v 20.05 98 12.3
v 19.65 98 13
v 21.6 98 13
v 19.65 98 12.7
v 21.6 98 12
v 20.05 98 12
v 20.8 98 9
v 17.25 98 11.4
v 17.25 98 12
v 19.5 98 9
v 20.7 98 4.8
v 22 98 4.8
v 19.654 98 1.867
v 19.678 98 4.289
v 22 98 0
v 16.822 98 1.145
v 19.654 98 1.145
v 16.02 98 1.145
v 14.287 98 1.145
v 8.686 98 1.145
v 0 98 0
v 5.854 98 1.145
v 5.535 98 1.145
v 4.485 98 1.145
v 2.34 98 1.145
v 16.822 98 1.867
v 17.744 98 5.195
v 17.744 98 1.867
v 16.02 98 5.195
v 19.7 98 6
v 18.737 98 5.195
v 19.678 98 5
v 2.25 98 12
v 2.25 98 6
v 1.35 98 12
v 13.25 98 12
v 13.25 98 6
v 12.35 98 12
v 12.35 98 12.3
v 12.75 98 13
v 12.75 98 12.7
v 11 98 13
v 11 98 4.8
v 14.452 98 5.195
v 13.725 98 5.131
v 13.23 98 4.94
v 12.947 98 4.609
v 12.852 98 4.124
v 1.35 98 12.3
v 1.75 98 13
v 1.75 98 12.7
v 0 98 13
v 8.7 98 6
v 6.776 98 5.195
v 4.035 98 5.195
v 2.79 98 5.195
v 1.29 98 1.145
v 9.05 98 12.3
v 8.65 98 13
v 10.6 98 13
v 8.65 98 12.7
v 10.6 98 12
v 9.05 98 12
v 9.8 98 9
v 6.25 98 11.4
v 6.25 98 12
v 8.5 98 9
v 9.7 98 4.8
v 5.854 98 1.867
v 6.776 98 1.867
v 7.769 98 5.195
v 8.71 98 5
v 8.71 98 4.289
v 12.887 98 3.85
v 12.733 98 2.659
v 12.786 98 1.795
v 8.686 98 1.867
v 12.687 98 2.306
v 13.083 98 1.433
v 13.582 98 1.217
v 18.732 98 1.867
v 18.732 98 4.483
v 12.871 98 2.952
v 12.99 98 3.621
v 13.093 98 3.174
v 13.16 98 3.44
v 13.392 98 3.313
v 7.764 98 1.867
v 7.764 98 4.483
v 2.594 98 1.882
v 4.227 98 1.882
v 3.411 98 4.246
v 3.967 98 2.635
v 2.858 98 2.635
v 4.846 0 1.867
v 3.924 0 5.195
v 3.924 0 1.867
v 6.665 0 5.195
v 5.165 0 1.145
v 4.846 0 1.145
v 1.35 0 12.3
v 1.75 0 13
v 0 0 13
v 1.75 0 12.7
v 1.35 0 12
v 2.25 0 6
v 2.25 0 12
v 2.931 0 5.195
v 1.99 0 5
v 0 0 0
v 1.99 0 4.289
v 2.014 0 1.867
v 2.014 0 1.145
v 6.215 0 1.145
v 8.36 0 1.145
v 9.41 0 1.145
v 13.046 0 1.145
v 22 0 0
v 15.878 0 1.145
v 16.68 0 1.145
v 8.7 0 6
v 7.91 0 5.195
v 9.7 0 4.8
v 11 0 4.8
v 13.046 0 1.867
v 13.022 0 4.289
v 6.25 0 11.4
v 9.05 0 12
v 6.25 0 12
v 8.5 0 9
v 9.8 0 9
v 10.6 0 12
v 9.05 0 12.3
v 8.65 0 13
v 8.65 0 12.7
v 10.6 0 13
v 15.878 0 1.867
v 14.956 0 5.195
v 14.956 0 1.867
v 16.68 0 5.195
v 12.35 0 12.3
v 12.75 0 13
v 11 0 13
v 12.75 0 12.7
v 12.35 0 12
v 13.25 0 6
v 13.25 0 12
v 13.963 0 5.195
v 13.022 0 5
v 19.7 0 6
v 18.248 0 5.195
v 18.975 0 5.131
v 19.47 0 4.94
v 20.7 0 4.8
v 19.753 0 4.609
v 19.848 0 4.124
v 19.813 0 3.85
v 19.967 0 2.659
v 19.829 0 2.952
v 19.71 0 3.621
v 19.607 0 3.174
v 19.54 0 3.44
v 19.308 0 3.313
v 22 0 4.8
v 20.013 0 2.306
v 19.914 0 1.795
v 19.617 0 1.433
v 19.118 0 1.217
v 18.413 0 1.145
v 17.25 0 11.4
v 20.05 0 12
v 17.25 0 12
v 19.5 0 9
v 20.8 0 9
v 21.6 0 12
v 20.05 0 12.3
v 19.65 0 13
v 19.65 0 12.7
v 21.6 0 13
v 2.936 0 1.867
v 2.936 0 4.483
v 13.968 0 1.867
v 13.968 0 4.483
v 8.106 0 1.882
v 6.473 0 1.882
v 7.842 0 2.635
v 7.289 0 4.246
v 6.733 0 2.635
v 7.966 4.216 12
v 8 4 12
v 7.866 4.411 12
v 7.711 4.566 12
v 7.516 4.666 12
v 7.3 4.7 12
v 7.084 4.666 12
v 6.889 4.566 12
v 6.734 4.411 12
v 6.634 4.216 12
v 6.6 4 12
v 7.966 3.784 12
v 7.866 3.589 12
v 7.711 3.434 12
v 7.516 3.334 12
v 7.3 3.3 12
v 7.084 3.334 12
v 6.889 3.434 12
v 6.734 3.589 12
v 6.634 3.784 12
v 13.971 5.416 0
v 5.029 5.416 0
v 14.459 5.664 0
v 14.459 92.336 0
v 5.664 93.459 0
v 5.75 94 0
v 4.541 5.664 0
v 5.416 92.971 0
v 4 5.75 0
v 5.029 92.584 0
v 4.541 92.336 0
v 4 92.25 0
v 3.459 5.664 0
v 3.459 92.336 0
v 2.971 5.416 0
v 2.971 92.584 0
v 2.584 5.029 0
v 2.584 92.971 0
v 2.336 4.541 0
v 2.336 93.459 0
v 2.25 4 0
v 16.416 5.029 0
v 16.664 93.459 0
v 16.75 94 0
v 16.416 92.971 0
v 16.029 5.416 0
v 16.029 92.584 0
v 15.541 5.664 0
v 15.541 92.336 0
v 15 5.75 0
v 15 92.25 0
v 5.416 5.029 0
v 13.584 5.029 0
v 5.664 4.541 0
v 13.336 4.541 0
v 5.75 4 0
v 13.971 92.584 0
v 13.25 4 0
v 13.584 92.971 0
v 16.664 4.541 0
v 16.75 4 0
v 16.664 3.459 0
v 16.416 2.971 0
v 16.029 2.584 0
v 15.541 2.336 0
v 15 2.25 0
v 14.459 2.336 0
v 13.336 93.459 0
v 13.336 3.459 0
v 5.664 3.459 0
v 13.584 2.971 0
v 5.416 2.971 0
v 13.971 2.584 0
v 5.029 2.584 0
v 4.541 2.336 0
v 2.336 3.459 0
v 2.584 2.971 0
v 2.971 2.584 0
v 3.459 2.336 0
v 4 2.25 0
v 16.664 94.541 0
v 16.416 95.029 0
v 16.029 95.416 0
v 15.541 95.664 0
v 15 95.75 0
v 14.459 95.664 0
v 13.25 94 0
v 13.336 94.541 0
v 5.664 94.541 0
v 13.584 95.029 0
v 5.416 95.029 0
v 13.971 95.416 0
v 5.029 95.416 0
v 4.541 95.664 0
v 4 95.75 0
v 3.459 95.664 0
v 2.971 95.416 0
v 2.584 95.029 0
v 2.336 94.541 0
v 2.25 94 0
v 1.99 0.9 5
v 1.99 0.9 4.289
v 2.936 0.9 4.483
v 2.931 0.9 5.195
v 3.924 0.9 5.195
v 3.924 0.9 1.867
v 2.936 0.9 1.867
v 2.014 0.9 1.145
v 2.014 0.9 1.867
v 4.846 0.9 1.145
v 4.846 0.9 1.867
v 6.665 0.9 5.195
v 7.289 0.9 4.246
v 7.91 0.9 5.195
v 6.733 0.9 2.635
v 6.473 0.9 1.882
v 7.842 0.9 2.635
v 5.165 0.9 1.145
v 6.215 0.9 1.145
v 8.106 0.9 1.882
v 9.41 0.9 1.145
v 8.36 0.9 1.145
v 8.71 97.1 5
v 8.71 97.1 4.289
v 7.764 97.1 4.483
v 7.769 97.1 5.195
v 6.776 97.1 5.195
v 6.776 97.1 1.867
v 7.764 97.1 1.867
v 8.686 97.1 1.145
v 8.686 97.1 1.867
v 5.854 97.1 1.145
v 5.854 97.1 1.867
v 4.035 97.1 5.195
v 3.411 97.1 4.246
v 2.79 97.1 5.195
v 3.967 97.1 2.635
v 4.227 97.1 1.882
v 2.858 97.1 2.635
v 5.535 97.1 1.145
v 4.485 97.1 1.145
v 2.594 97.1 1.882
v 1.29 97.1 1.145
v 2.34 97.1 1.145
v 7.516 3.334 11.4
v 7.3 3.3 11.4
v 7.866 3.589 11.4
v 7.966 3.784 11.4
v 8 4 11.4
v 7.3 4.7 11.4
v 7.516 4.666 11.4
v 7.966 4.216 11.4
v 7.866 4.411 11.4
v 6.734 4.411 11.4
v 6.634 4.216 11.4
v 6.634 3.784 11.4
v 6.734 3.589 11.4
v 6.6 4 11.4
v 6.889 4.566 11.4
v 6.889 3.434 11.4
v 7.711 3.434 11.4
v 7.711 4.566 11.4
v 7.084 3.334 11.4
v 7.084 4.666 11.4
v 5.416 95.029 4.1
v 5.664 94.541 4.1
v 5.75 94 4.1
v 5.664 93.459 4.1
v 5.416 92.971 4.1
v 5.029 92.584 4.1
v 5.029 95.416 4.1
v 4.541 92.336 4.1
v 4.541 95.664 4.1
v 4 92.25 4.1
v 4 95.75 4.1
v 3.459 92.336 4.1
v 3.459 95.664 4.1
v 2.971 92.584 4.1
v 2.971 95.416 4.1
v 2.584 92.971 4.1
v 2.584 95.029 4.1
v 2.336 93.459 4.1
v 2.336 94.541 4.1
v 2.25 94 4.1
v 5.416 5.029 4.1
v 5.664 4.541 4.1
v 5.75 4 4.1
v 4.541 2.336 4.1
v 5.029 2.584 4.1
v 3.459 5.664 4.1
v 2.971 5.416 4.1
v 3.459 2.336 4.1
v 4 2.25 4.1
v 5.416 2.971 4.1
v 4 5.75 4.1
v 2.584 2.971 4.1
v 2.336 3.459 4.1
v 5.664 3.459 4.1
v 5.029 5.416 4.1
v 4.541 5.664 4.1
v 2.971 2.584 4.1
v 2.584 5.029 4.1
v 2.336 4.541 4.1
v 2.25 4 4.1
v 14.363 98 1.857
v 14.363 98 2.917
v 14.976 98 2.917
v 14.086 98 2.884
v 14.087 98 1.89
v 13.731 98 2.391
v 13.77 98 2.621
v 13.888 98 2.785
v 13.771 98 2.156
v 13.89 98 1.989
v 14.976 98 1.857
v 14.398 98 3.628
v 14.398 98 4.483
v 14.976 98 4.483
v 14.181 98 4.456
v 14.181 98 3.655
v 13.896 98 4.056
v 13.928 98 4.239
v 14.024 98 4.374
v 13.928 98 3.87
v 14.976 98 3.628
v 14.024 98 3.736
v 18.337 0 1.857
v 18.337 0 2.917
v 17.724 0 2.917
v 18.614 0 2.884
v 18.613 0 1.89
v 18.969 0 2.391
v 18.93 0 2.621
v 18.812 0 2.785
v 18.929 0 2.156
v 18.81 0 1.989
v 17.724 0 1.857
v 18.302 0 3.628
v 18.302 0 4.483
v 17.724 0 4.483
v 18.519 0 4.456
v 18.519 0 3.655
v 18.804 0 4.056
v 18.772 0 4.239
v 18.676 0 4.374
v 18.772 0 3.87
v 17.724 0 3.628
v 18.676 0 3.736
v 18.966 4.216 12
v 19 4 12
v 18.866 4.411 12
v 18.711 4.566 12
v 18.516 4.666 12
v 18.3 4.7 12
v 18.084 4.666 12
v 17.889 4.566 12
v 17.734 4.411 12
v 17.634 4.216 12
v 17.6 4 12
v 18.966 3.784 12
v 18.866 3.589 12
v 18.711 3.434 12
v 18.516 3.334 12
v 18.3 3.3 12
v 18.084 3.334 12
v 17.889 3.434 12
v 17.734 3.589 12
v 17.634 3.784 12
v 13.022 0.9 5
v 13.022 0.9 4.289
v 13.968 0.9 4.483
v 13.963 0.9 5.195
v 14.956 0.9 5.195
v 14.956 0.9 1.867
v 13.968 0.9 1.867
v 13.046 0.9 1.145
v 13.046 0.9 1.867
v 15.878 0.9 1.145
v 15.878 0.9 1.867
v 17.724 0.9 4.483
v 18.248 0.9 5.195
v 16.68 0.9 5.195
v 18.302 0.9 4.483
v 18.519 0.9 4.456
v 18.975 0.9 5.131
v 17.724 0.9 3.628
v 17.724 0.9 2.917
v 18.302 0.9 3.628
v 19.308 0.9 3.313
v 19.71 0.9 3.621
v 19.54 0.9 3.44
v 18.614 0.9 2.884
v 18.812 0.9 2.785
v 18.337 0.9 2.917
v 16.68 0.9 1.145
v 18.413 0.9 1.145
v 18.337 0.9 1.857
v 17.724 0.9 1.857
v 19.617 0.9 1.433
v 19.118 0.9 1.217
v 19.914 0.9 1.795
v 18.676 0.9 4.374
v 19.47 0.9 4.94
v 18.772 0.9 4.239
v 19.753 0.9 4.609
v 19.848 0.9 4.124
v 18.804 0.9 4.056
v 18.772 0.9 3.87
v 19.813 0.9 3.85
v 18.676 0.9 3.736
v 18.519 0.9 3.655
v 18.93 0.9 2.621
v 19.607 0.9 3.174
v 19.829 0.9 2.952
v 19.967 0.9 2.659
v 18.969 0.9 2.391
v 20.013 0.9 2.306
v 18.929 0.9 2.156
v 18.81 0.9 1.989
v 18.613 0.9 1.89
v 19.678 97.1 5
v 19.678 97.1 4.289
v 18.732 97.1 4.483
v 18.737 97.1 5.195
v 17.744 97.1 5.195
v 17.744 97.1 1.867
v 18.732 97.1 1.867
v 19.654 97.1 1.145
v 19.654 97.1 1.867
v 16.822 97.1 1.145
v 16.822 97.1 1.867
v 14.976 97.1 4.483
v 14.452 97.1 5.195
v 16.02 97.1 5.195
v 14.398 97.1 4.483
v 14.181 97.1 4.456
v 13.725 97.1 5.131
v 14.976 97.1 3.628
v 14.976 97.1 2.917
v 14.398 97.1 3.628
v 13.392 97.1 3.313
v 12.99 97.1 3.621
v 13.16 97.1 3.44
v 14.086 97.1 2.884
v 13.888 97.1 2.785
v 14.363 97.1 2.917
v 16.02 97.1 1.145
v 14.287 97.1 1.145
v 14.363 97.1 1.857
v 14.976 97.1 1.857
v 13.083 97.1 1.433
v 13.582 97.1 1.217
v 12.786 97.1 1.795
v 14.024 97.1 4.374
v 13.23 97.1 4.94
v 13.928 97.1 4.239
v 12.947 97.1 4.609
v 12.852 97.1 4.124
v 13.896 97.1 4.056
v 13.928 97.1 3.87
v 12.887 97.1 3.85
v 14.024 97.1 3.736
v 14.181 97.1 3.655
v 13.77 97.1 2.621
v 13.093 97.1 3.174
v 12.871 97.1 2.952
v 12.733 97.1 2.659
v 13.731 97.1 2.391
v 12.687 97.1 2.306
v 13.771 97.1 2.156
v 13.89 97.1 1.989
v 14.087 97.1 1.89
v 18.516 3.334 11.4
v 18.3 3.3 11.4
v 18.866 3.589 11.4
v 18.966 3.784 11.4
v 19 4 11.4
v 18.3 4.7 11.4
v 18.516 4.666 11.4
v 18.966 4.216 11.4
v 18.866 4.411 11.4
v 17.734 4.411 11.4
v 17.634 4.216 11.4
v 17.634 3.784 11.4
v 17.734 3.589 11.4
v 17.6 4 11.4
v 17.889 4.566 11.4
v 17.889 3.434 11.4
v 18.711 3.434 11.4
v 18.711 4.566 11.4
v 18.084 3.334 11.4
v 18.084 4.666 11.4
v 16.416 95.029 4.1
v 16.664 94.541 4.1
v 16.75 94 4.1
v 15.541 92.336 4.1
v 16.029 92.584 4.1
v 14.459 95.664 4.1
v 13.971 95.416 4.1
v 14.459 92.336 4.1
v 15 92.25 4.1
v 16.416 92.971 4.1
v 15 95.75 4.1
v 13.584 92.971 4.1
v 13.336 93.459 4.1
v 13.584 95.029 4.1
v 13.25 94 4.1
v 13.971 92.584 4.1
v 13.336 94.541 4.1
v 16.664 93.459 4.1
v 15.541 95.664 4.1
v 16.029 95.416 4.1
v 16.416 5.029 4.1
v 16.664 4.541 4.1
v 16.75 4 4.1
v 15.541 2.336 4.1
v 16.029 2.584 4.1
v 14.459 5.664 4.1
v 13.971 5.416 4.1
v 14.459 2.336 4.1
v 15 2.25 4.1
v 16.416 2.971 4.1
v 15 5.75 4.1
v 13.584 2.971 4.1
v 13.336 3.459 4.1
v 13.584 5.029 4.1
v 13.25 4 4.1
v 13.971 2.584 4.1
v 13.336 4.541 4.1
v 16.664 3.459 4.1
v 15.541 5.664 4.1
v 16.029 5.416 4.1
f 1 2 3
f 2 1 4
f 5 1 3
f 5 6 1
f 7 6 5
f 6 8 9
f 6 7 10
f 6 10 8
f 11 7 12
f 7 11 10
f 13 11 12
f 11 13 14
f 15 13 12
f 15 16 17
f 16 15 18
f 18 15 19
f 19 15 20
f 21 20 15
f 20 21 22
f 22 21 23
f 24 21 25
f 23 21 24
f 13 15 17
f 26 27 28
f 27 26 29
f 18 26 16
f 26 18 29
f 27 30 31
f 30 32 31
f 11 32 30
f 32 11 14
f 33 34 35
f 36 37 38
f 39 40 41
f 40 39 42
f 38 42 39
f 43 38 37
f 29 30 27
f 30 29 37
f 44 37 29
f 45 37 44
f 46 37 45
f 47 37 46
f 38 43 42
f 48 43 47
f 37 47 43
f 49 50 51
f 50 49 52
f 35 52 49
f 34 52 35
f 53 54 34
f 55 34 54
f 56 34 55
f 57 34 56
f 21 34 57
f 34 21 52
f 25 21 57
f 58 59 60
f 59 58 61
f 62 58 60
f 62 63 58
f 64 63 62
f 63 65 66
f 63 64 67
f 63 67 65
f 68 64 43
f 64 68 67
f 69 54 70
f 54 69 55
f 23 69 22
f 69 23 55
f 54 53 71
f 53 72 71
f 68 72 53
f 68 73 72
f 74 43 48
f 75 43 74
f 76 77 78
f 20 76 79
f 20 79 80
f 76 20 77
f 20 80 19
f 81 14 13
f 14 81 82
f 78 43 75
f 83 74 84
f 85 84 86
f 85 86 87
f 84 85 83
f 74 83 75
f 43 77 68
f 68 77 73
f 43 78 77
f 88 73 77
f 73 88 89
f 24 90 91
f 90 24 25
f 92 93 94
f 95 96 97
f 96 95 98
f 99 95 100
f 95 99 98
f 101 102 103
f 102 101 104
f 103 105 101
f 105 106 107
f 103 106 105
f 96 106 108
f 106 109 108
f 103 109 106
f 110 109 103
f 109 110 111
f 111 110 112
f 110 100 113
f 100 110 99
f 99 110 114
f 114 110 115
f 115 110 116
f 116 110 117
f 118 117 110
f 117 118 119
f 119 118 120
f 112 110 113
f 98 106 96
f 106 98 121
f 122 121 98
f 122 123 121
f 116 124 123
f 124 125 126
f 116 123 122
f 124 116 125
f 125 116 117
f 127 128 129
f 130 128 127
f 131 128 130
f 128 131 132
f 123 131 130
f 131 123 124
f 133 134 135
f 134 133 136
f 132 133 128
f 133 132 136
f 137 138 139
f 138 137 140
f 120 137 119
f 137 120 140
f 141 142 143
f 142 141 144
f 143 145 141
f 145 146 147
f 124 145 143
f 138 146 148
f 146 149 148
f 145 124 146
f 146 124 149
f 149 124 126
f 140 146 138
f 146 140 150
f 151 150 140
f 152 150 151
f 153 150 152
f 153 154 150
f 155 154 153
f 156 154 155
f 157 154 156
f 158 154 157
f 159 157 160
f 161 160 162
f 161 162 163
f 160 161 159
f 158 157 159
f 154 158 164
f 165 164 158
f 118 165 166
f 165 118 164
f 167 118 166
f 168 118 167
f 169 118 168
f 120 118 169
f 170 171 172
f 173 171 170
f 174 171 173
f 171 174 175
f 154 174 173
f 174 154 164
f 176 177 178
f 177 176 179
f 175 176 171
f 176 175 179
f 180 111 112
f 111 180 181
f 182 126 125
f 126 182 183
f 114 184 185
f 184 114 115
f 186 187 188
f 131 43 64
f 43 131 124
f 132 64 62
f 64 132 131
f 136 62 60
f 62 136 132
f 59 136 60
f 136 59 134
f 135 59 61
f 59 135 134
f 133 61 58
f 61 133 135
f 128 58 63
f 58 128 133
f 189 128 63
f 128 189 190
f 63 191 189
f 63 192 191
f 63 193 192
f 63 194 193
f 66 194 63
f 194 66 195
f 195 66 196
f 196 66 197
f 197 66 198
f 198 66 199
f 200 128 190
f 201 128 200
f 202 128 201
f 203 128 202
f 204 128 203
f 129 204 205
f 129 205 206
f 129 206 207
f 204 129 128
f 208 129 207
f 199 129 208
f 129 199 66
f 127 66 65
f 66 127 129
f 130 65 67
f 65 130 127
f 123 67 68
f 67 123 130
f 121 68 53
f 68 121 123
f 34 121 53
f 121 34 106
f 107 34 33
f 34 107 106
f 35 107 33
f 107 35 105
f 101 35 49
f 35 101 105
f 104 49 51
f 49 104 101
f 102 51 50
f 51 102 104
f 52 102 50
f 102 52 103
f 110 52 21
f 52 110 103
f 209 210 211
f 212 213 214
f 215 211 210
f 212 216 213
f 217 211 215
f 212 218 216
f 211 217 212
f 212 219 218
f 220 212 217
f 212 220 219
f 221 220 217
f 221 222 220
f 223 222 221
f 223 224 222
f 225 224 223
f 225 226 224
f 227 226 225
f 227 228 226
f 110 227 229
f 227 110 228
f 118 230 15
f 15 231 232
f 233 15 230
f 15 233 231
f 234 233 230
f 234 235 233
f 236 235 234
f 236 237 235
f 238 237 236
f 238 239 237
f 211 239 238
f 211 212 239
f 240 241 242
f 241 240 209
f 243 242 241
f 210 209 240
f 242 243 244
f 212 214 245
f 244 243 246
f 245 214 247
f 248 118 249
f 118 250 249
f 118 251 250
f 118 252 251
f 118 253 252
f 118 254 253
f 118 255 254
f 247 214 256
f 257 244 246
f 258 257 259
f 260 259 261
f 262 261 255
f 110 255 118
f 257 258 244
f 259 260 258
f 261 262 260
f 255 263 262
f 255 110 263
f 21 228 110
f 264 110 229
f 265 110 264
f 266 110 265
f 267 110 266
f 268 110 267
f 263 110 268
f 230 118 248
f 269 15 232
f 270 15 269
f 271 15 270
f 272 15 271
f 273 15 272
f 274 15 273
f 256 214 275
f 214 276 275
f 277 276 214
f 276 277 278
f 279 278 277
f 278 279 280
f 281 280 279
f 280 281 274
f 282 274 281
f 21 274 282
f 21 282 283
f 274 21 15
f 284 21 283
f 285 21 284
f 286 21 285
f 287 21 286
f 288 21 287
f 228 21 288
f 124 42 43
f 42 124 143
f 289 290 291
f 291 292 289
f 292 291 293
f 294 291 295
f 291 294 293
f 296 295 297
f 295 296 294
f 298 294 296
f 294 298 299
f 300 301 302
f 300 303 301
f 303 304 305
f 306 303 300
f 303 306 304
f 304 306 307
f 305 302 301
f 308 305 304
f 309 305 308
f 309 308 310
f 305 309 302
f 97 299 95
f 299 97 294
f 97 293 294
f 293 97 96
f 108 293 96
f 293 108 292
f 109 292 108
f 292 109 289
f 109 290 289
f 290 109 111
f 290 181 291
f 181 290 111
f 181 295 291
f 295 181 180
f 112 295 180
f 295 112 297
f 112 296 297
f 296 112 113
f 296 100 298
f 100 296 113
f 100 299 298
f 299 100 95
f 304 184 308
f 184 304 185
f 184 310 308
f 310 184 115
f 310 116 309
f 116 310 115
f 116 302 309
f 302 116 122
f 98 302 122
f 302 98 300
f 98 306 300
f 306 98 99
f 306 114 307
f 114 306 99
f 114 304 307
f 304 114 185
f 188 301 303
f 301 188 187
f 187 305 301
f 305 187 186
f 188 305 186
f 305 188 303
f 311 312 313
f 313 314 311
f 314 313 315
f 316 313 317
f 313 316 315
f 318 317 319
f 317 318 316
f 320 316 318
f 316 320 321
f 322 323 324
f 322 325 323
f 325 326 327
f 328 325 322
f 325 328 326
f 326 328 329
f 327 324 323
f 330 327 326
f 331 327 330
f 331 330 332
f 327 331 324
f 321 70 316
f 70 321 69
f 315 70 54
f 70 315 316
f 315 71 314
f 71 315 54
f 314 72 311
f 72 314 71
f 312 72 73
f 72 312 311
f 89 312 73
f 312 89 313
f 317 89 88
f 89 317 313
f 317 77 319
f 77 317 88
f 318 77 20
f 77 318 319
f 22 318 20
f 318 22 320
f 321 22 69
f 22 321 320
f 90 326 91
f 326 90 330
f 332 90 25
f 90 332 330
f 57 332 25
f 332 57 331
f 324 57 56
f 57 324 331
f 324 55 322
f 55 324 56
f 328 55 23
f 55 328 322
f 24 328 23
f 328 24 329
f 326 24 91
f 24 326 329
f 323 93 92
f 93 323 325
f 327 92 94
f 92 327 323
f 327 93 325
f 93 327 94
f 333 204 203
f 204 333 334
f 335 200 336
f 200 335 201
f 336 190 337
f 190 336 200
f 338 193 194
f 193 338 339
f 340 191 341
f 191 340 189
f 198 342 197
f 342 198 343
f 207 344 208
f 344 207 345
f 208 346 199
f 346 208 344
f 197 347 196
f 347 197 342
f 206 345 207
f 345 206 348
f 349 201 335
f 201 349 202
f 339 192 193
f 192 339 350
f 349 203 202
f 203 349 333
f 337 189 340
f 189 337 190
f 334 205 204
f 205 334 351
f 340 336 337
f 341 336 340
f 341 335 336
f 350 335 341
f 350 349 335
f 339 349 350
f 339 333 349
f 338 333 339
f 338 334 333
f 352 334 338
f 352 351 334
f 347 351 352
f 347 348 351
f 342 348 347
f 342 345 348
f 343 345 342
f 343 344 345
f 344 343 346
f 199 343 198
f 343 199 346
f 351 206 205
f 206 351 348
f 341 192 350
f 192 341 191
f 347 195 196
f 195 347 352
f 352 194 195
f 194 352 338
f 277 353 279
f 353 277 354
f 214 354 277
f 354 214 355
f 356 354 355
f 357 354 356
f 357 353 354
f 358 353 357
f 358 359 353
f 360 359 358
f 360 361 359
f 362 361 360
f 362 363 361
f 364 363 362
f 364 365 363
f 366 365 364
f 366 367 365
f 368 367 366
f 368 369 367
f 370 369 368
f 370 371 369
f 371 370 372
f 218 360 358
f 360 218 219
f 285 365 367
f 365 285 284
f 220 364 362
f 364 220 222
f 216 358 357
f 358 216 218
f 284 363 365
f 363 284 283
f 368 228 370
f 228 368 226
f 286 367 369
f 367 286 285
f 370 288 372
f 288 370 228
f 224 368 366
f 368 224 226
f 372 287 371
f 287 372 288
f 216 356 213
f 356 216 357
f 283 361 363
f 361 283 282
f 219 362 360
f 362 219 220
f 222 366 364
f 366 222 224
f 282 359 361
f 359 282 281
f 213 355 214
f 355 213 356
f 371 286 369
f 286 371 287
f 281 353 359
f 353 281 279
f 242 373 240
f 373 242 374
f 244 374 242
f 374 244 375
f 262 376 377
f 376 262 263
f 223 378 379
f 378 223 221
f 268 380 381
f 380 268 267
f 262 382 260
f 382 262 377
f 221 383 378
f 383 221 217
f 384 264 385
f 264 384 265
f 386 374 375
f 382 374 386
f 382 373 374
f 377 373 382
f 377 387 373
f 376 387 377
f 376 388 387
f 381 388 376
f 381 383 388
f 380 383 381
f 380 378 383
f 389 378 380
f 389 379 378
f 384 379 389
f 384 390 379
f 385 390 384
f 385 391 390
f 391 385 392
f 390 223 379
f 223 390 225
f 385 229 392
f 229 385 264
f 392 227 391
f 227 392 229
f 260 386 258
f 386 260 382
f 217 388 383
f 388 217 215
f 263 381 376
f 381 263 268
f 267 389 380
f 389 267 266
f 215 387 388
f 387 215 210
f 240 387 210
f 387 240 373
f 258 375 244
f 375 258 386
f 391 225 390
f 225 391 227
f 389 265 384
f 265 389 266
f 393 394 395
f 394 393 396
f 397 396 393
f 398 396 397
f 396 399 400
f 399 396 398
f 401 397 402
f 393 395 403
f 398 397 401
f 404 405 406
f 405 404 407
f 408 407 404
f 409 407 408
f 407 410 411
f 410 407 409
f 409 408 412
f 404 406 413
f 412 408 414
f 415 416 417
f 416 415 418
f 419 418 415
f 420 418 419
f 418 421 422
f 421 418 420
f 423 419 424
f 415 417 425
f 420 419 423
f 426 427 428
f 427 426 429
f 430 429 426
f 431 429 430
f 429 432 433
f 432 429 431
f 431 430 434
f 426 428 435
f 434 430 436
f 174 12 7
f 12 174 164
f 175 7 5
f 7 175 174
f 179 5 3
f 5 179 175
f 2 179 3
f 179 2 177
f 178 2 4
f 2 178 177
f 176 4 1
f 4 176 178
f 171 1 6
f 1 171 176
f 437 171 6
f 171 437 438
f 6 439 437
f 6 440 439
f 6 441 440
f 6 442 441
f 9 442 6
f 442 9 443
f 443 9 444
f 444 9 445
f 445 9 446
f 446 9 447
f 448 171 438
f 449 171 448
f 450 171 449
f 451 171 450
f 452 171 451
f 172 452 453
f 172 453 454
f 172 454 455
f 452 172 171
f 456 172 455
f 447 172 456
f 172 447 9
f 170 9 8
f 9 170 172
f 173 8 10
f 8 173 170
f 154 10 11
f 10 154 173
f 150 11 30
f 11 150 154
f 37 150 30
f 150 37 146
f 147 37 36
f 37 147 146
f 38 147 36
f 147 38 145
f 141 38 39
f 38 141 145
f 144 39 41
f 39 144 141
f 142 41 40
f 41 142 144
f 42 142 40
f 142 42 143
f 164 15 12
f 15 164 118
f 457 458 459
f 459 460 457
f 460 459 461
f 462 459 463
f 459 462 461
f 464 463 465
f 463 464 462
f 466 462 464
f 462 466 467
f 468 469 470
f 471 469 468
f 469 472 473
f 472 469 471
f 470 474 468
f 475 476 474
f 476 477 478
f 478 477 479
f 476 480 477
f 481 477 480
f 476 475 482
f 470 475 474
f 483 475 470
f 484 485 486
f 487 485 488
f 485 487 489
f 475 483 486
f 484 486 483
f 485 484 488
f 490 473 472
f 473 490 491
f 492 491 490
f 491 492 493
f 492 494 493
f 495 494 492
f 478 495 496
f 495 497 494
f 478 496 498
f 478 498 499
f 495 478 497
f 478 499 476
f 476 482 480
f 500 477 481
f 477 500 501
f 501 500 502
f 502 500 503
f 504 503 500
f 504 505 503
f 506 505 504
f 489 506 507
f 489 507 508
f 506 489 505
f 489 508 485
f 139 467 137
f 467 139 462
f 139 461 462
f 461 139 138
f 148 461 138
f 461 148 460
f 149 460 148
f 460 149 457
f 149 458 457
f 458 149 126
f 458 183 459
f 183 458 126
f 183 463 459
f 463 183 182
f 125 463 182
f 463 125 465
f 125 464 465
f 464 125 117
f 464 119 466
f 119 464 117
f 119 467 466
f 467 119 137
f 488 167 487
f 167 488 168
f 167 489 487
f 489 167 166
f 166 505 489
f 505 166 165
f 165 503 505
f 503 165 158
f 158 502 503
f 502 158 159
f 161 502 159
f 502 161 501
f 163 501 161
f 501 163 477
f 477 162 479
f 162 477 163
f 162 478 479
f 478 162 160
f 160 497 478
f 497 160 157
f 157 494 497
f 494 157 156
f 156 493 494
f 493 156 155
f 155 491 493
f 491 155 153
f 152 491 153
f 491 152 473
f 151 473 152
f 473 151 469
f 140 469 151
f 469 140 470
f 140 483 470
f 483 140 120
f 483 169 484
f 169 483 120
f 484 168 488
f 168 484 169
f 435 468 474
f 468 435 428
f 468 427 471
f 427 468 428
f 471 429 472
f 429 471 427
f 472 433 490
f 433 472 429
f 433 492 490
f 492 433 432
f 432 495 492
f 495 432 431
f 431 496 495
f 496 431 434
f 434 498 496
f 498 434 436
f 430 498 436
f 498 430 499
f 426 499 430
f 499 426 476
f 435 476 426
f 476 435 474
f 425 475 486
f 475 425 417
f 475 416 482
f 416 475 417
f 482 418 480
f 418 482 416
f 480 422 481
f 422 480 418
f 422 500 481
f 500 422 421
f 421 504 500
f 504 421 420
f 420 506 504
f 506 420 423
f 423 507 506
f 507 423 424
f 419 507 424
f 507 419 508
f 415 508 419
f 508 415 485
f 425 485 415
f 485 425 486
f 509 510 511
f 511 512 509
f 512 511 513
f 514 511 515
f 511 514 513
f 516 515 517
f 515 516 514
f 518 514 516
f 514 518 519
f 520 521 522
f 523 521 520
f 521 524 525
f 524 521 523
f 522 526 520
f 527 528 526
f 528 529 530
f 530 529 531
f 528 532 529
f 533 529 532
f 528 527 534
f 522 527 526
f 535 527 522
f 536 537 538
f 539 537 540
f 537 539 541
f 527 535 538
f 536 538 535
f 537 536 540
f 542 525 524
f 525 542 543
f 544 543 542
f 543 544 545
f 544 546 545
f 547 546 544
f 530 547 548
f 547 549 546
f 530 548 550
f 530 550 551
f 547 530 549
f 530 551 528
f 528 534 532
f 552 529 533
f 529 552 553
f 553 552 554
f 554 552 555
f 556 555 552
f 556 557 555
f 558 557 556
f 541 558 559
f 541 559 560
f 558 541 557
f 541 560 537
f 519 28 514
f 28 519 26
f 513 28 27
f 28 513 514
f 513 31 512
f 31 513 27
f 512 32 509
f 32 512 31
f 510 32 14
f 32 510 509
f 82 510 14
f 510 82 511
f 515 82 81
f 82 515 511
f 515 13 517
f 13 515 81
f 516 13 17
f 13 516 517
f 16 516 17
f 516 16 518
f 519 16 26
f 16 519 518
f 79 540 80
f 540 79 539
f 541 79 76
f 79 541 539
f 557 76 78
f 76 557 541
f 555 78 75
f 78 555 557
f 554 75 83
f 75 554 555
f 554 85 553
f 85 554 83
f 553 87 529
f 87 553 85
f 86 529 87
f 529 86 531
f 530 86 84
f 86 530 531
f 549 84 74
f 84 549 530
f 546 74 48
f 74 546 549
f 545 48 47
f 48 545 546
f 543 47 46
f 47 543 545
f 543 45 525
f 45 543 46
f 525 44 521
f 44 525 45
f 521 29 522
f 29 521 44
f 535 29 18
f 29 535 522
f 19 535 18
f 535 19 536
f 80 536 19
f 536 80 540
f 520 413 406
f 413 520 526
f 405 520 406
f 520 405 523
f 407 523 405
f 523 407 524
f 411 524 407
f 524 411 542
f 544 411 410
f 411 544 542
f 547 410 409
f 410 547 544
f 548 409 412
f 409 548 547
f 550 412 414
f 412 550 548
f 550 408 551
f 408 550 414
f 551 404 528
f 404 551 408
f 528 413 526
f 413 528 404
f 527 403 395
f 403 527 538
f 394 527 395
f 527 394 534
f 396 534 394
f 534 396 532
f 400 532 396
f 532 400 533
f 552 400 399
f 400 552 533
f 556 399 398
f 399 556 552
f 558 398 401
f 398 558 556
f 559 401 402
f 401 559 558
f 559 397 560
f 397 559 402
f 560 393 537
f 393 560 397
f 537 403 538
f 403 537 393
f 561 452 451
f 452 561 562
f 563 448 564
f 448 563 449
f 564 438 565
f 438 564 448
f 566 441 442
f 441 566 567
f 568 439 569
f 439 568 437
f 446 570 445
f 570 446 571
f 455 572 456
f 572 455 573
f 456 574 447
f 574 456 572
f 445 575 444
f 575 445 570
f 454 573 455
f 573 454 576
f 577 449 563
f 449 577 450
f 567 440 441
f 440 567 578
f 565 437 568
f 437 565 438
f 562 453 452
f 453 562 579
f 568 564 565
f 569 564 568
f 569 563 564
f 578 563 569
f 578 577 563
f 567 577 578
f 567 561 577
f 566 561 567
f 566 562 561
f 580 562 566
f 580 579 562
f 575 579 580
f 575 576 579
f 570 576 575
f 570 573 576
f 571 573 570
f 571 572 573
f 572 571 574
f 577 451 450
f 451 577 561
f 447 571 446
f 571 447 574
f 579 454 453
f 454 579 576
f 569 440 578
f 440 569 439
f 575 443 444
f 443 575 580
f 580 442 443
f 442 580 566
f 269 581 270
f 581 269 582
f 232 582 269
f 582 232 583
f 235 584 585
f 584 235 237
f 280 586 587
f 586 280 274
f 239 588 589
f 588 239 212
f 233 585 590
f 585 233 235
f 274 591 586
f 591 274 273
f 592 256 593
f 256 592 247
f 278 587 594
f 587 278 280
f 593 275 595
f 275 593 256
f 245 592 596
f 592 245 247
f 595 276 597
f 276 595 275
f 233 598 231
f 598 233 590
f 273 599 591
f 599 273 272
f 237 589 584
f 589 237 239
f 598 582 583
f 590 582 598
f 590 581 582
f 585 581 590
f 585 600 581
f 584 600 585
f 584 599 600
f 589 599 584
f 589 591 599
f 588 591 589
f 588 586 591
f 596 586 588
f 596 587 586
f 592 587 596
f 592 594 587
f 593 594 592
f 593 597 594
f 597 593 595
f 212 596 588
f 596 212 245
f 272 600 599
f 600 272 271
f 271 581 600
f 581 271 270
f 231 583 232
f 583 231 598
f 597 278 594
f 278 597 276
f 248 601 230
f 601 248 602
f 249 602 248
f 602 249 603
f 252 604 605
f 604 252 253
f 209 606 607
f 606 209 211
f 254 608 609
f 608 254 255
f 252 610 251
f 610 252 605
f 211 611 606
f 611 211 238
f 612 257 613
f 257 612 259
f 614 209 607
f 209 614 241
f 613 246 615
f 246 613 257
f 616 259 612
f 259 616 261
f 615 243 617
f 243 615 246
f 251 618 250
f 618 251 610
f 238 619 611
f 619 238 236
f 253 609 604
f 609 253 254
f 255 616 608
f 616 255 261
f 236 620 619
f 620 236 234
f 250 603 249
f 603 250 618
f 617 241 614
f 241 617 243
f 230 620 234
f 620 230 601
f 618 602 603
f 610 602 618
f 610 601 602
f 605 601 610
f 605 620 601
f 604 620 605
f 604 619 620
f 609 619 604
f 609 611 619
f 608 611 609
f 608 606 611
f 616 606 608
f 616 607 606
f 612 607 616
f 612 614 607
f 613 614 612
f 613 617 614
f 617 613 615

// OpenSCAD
/*
Author: Michael

2017/10/28

*/

/* [basic parameters] */

//How wide is the tape?
tapeWidth=8; // [8, 12, 16, 24, 36, 48, 72]
//Optimize for Plastic or Paper tape? Plastic tapes fit in Paper, but not reverse. Plastic tapes may be too loose in paper feeder.
tapeHeight=0.3; // [0.9:paper,0.3:plastic]
//How many feeder to print ganged
numberOfFeeders=2; // [1:1:20]
//Overall length of feeder?
feederLength=98;
//Height of tape's bottom side above bed
tapeLayerHeight=12;
//Bank ID: To identify the feeder in OpenPnP unique IDs for each bank are built and embossed into the ganged feeder. -1: no identifier.
bankID=1; //[-1:1:9]
//diameter of pockets on the side to put a magnet in
magnetDiameter=5;
//height of the pocket for the magnet
magnetHeight=4;

/* [advanced] */

//controls the force to keep the tape in place. lower value higher force and though friction
tapeClearance=-0.3;     // [-0.5:0.05:0.5]
bodyHeight=6;
tapeSupportHoleSide=2.8;
tapeSupportNonHoleSide=0.9;



/* [expert] */
//higher values make the left arm stronger
additionalWidth=3;
topFinishingLayer=0.3;
tapeGuideUpperOverhang=0.4;
//lower values make the spring smaller thus less force on tape, should be slightly less than a multiple of extrusion-width
springWidth=1.3;
springSkew=1.2;
//if two tapeloaded lanes touch each other raise this value a little
springClearance=0.4;

magnetHoleDistanceEdge = 4;

overallWidth=tapeWidth+additionalWidth;
overallHeight=tapeLayerHeight+tapeHeight+tapeGuideUpperOverhang+topFinishingLayer;
tapeXcenter=(overallWidth/2)+tapeClearance/2;

    

//make the feeders
gang_feeder();


// customizer specific stuff
// preview[view:north west, tilt:top diagonal]


module gang_feeder() {

    difference() {
        union() {

                
            //stack up feeders
            for(i=[0:1:numberOfFeeders-1]) {
                translate([i*(tapeWidth+additionalWidth),0,0]) 
                    feeder_body(i);
            }
            
            
        }
        
        //magnet pockets
//        for(j=[0:1:2]) {
//            //magnet pockets right side
//            translate([0,j*((feederLength-49)/2)+24.5,0]) {
//                translate([(numberOfFeeders)*(tapeWidth+additionalWidth),0,0 ]) {
//                    magnetic_fixation_pocket(0,feederLength/2);
//                }
//            }
//            
//        }
//        
//        for(j=[0:1:3]) {
//            translate([0,j*((feederLength-15)/3)+7.5,0]) {
//                //magnet pockets left side
//                rotate([0,0,180])
//                    magnetic_fixation_pocket(0,feederLength/2);
//            }
//        }
    }
}

module feeder_cover() {
    cube([2,feederLength,overallHeight]);
}

module feeder_body(feederNo) {
    translate([0,feederLength,0]) {
        rotate([90,0,0]) {
            difference() {
                
                //main form
                linear_extrude(feederLength) {
                    polygon(points=[
                        //base
                        [0,0],
                        [overallWidth,0],
                    
                        //right arm way up ("spring", outer part)
                        [overallWidth,bodyHeight*0.8],
                        [overallWidth-springSkew,tapeLayerHeight-3],
                        [overallWidth-springClearance,tapeLayerHeight],
                    
                        //right arm tape guide
                        [overallWidth-springClearance,overallHeight],
                        [tapeXcenter+tapeWidth/2+tapeClearance-tapeGuideUpperOverhang,overallHeight],
                        [tapeXcenter+tapeWidth/2+tapeClearance-tapeGuideUpperOverhang,tapeLayerHeight+tapeHeight+tapeGuideUpperOverhang],
                        [tapeXcenter+tapeWidth/2+tapeClearance,tapeLayerHeight+tapeHeight],
                        [tapeXcenter+tapeWidth/2+tapeClearance,tapeLayerHeight],
                        [tapeXcenter+tapeWidth/2+tapeClearance-tapeSupportHoleSide,tapeLayerHeight],
                        [tapeXcenter+tapeWidth/2+tapeClearance-tapeSupportHoleSide,tapeLayerHeight-0.6],
                    
                        //right arm way down ("spring", inner part)
                        [overallWidth-springSkew-springWidth,tapeLayerHeight-3],
                        [overallWidth-springWidth,bodyHeight*0.8],
                        [overallWidth-springWidth-1,bodyHeight],
                        
                        //base (inner part)
                        [tapeXcenter-tapeWidth/2+tapeSupportNonHoleSide,bodyHeight],
                        
                        //left arm up (inner part)
                        [tapeXcenter-tapeWidth/2+tapeSupportNonHoleSide,tapeLayerHeight],
                        
                        //left arm tape guide
                        [tapeXcenter-tapeWidth/2,tapeLayerHeight],
                        [tapeXcenter-tapeWidth/2,tapeLayerHeight+tapeHeight],
                        [tapeXcenter-tapeWidth/2+tapeGuideUpperOverhang,tapeLayerHeight+tapeHeight+tapeGuideUpperOverhang],
                        [tapeXcenter-tapeWidth/2+tapeGuideUpperOverhang,overallHeight],
                        
                        //left arm down (outer part)
                        [0,overallHeight],
                        [0,0]

                    ]);
                }
                
                //direction of travel while picking with OpenPnP
//                if(feederLength>=100) {
//                    for (i=[0:1:3]) {
//                        translate([additionalWidth+3/2+0.5,bodyHeight+0.1,feederLength-25-(i*6)])
//                            rotate([90,90,0])
//                                linear_extrude(1)
//                                    circle(3,$fn=3);
//                    }
//                }
                
                //4 identification marks
//                translate([additionalWidth,bodyHeight-0.9,feederLength-2])
//                    rotate([90,90,180])
//                        identification_mark(feederNo,"left","top");
//                
//                translate([additionalWidth,bodyHeight-0.9,2])
//                    rotate([90,90,180])
//                        identification_mark(feederNo,"right","top");
                
                translate([tapeXcenter,bodyHeight-0.9,feederLength-0.9])
                    rotate([0,0,0])
                        identification_mark(feederNo,"center","top");
                
                translate([tapeXcenter,bodyHeight-0.9,0.9])
                    rotate([0,180,0])
                        identification_mark(feederNo,"center","top");
                
                //reference hole
                translate([tapeXcenter+tapeWidth/2+tapeClearance-1.75,tapeLayerHeight,feederLength-4])
                    rotate([90,90,0])
                        cylinder(h=0.6,d=1.4,center=false,$fn=20);
                
                //3 registration points (for magnets, bolts or to screw from top)
                //bottom_fixation(feederLength/2);
                bottom_fixation(magnetHoleDistanceEdge);
                bottom_fixation(feederLength-magnetHoleDistanceEdge);
                

            }
        }
    }
}

module identification_mark(feederNo,_halign,_valign) {

    if(bankID!=-1) {
        linear_extrude(height=.91) {
            text( str(bankID, chr(feederNo+65) ),font=":style=Bold", size=4, valign=_valign, halign=_halign);
        }
    }
                
}

module magnetic_fixation_pocket() {
    layerBelow=0.25;
    magnetInset=1;
    magnetDiameterOversizedFor3dPrinting=magnetDiameter+0.2;
    
    translate([0,0,layerBelow]) {
            union() {
                translate([-(magnetDiameterOversizedFor3dPrinting)/2-magnetInset,0,0])
                    cylinder(d=magnetDiameterOversizedFor3dPrinting,h=magnetHeight+0.3,$fn=20);
                
                hull() {
                    translate([-(magnetDiameterOversizedFor3dPrinting)/2-magnetInset,0,0])
                        cylinder(d=magnetDiameterOversizedFor3dPrinting-1.4,h=magnetHeight+0.3,$fn=20);
                    translate([0,0,(magnetHeight+0.3)/2])
                        cube([0.1,magnetDiameterOversizedFor3dPrinting+0.4,magnetHeight+0.3],center=true);
                }
                
                translate([-(magnetDiameterOversizedFor3dPrinting)/2-magnetInset,0,0]) {
                    difference() {
                        cylinder(d=magnetDiameterOversizedFor3dPrinting+3,h=magnetHeight+0.3,$fn=20);
                        cylinder(d=magnetDiameterOversizedFor3dPrinting+2,h=magnetHeight+0.3,$fn=20);
                    }
                }
            }
        translate([-(magnetDiameterOversizedFor3dPrinting-magnetInset+1)/2-magnetInset,0,0])
            cube([magnetDiameterOversizedFor3dPrinting,1,1],center=true);
    }
}
            
module bottom_fixation(pos_y) {
    layerForBridging=0.3;
    cutoutbelow=3.5;
    union() {
//        translate([tapeXcenter,bodyHeight-1,pos_y])
//                rotate([-90,0,0])
//                    cylinder(h = 2.1, r=6.0/2, $fn=20);
        
        translate([4,-0.1,pos_y])
                rotate([-90,0,0])
                    cylinder(h = magnetHeight+0.2, r=3.5/2, $fn=20);
        
        //old pocket below feeder for magnet
//        *translate([tapeXcenter,cutoutbelow,pos_y])
//                rotate([90,0,0])
//                    cylinder(h = 10, r=6.0/2, $fn=20);
        
        //chamfer
////        *translate([tapeXcenter,0.3,pos_y])
////                rotate([90,0,0])
////                    cylinder(h = 0.3, r1=6.0/2, r2=6.3/2, $fn=20);
    }
}
